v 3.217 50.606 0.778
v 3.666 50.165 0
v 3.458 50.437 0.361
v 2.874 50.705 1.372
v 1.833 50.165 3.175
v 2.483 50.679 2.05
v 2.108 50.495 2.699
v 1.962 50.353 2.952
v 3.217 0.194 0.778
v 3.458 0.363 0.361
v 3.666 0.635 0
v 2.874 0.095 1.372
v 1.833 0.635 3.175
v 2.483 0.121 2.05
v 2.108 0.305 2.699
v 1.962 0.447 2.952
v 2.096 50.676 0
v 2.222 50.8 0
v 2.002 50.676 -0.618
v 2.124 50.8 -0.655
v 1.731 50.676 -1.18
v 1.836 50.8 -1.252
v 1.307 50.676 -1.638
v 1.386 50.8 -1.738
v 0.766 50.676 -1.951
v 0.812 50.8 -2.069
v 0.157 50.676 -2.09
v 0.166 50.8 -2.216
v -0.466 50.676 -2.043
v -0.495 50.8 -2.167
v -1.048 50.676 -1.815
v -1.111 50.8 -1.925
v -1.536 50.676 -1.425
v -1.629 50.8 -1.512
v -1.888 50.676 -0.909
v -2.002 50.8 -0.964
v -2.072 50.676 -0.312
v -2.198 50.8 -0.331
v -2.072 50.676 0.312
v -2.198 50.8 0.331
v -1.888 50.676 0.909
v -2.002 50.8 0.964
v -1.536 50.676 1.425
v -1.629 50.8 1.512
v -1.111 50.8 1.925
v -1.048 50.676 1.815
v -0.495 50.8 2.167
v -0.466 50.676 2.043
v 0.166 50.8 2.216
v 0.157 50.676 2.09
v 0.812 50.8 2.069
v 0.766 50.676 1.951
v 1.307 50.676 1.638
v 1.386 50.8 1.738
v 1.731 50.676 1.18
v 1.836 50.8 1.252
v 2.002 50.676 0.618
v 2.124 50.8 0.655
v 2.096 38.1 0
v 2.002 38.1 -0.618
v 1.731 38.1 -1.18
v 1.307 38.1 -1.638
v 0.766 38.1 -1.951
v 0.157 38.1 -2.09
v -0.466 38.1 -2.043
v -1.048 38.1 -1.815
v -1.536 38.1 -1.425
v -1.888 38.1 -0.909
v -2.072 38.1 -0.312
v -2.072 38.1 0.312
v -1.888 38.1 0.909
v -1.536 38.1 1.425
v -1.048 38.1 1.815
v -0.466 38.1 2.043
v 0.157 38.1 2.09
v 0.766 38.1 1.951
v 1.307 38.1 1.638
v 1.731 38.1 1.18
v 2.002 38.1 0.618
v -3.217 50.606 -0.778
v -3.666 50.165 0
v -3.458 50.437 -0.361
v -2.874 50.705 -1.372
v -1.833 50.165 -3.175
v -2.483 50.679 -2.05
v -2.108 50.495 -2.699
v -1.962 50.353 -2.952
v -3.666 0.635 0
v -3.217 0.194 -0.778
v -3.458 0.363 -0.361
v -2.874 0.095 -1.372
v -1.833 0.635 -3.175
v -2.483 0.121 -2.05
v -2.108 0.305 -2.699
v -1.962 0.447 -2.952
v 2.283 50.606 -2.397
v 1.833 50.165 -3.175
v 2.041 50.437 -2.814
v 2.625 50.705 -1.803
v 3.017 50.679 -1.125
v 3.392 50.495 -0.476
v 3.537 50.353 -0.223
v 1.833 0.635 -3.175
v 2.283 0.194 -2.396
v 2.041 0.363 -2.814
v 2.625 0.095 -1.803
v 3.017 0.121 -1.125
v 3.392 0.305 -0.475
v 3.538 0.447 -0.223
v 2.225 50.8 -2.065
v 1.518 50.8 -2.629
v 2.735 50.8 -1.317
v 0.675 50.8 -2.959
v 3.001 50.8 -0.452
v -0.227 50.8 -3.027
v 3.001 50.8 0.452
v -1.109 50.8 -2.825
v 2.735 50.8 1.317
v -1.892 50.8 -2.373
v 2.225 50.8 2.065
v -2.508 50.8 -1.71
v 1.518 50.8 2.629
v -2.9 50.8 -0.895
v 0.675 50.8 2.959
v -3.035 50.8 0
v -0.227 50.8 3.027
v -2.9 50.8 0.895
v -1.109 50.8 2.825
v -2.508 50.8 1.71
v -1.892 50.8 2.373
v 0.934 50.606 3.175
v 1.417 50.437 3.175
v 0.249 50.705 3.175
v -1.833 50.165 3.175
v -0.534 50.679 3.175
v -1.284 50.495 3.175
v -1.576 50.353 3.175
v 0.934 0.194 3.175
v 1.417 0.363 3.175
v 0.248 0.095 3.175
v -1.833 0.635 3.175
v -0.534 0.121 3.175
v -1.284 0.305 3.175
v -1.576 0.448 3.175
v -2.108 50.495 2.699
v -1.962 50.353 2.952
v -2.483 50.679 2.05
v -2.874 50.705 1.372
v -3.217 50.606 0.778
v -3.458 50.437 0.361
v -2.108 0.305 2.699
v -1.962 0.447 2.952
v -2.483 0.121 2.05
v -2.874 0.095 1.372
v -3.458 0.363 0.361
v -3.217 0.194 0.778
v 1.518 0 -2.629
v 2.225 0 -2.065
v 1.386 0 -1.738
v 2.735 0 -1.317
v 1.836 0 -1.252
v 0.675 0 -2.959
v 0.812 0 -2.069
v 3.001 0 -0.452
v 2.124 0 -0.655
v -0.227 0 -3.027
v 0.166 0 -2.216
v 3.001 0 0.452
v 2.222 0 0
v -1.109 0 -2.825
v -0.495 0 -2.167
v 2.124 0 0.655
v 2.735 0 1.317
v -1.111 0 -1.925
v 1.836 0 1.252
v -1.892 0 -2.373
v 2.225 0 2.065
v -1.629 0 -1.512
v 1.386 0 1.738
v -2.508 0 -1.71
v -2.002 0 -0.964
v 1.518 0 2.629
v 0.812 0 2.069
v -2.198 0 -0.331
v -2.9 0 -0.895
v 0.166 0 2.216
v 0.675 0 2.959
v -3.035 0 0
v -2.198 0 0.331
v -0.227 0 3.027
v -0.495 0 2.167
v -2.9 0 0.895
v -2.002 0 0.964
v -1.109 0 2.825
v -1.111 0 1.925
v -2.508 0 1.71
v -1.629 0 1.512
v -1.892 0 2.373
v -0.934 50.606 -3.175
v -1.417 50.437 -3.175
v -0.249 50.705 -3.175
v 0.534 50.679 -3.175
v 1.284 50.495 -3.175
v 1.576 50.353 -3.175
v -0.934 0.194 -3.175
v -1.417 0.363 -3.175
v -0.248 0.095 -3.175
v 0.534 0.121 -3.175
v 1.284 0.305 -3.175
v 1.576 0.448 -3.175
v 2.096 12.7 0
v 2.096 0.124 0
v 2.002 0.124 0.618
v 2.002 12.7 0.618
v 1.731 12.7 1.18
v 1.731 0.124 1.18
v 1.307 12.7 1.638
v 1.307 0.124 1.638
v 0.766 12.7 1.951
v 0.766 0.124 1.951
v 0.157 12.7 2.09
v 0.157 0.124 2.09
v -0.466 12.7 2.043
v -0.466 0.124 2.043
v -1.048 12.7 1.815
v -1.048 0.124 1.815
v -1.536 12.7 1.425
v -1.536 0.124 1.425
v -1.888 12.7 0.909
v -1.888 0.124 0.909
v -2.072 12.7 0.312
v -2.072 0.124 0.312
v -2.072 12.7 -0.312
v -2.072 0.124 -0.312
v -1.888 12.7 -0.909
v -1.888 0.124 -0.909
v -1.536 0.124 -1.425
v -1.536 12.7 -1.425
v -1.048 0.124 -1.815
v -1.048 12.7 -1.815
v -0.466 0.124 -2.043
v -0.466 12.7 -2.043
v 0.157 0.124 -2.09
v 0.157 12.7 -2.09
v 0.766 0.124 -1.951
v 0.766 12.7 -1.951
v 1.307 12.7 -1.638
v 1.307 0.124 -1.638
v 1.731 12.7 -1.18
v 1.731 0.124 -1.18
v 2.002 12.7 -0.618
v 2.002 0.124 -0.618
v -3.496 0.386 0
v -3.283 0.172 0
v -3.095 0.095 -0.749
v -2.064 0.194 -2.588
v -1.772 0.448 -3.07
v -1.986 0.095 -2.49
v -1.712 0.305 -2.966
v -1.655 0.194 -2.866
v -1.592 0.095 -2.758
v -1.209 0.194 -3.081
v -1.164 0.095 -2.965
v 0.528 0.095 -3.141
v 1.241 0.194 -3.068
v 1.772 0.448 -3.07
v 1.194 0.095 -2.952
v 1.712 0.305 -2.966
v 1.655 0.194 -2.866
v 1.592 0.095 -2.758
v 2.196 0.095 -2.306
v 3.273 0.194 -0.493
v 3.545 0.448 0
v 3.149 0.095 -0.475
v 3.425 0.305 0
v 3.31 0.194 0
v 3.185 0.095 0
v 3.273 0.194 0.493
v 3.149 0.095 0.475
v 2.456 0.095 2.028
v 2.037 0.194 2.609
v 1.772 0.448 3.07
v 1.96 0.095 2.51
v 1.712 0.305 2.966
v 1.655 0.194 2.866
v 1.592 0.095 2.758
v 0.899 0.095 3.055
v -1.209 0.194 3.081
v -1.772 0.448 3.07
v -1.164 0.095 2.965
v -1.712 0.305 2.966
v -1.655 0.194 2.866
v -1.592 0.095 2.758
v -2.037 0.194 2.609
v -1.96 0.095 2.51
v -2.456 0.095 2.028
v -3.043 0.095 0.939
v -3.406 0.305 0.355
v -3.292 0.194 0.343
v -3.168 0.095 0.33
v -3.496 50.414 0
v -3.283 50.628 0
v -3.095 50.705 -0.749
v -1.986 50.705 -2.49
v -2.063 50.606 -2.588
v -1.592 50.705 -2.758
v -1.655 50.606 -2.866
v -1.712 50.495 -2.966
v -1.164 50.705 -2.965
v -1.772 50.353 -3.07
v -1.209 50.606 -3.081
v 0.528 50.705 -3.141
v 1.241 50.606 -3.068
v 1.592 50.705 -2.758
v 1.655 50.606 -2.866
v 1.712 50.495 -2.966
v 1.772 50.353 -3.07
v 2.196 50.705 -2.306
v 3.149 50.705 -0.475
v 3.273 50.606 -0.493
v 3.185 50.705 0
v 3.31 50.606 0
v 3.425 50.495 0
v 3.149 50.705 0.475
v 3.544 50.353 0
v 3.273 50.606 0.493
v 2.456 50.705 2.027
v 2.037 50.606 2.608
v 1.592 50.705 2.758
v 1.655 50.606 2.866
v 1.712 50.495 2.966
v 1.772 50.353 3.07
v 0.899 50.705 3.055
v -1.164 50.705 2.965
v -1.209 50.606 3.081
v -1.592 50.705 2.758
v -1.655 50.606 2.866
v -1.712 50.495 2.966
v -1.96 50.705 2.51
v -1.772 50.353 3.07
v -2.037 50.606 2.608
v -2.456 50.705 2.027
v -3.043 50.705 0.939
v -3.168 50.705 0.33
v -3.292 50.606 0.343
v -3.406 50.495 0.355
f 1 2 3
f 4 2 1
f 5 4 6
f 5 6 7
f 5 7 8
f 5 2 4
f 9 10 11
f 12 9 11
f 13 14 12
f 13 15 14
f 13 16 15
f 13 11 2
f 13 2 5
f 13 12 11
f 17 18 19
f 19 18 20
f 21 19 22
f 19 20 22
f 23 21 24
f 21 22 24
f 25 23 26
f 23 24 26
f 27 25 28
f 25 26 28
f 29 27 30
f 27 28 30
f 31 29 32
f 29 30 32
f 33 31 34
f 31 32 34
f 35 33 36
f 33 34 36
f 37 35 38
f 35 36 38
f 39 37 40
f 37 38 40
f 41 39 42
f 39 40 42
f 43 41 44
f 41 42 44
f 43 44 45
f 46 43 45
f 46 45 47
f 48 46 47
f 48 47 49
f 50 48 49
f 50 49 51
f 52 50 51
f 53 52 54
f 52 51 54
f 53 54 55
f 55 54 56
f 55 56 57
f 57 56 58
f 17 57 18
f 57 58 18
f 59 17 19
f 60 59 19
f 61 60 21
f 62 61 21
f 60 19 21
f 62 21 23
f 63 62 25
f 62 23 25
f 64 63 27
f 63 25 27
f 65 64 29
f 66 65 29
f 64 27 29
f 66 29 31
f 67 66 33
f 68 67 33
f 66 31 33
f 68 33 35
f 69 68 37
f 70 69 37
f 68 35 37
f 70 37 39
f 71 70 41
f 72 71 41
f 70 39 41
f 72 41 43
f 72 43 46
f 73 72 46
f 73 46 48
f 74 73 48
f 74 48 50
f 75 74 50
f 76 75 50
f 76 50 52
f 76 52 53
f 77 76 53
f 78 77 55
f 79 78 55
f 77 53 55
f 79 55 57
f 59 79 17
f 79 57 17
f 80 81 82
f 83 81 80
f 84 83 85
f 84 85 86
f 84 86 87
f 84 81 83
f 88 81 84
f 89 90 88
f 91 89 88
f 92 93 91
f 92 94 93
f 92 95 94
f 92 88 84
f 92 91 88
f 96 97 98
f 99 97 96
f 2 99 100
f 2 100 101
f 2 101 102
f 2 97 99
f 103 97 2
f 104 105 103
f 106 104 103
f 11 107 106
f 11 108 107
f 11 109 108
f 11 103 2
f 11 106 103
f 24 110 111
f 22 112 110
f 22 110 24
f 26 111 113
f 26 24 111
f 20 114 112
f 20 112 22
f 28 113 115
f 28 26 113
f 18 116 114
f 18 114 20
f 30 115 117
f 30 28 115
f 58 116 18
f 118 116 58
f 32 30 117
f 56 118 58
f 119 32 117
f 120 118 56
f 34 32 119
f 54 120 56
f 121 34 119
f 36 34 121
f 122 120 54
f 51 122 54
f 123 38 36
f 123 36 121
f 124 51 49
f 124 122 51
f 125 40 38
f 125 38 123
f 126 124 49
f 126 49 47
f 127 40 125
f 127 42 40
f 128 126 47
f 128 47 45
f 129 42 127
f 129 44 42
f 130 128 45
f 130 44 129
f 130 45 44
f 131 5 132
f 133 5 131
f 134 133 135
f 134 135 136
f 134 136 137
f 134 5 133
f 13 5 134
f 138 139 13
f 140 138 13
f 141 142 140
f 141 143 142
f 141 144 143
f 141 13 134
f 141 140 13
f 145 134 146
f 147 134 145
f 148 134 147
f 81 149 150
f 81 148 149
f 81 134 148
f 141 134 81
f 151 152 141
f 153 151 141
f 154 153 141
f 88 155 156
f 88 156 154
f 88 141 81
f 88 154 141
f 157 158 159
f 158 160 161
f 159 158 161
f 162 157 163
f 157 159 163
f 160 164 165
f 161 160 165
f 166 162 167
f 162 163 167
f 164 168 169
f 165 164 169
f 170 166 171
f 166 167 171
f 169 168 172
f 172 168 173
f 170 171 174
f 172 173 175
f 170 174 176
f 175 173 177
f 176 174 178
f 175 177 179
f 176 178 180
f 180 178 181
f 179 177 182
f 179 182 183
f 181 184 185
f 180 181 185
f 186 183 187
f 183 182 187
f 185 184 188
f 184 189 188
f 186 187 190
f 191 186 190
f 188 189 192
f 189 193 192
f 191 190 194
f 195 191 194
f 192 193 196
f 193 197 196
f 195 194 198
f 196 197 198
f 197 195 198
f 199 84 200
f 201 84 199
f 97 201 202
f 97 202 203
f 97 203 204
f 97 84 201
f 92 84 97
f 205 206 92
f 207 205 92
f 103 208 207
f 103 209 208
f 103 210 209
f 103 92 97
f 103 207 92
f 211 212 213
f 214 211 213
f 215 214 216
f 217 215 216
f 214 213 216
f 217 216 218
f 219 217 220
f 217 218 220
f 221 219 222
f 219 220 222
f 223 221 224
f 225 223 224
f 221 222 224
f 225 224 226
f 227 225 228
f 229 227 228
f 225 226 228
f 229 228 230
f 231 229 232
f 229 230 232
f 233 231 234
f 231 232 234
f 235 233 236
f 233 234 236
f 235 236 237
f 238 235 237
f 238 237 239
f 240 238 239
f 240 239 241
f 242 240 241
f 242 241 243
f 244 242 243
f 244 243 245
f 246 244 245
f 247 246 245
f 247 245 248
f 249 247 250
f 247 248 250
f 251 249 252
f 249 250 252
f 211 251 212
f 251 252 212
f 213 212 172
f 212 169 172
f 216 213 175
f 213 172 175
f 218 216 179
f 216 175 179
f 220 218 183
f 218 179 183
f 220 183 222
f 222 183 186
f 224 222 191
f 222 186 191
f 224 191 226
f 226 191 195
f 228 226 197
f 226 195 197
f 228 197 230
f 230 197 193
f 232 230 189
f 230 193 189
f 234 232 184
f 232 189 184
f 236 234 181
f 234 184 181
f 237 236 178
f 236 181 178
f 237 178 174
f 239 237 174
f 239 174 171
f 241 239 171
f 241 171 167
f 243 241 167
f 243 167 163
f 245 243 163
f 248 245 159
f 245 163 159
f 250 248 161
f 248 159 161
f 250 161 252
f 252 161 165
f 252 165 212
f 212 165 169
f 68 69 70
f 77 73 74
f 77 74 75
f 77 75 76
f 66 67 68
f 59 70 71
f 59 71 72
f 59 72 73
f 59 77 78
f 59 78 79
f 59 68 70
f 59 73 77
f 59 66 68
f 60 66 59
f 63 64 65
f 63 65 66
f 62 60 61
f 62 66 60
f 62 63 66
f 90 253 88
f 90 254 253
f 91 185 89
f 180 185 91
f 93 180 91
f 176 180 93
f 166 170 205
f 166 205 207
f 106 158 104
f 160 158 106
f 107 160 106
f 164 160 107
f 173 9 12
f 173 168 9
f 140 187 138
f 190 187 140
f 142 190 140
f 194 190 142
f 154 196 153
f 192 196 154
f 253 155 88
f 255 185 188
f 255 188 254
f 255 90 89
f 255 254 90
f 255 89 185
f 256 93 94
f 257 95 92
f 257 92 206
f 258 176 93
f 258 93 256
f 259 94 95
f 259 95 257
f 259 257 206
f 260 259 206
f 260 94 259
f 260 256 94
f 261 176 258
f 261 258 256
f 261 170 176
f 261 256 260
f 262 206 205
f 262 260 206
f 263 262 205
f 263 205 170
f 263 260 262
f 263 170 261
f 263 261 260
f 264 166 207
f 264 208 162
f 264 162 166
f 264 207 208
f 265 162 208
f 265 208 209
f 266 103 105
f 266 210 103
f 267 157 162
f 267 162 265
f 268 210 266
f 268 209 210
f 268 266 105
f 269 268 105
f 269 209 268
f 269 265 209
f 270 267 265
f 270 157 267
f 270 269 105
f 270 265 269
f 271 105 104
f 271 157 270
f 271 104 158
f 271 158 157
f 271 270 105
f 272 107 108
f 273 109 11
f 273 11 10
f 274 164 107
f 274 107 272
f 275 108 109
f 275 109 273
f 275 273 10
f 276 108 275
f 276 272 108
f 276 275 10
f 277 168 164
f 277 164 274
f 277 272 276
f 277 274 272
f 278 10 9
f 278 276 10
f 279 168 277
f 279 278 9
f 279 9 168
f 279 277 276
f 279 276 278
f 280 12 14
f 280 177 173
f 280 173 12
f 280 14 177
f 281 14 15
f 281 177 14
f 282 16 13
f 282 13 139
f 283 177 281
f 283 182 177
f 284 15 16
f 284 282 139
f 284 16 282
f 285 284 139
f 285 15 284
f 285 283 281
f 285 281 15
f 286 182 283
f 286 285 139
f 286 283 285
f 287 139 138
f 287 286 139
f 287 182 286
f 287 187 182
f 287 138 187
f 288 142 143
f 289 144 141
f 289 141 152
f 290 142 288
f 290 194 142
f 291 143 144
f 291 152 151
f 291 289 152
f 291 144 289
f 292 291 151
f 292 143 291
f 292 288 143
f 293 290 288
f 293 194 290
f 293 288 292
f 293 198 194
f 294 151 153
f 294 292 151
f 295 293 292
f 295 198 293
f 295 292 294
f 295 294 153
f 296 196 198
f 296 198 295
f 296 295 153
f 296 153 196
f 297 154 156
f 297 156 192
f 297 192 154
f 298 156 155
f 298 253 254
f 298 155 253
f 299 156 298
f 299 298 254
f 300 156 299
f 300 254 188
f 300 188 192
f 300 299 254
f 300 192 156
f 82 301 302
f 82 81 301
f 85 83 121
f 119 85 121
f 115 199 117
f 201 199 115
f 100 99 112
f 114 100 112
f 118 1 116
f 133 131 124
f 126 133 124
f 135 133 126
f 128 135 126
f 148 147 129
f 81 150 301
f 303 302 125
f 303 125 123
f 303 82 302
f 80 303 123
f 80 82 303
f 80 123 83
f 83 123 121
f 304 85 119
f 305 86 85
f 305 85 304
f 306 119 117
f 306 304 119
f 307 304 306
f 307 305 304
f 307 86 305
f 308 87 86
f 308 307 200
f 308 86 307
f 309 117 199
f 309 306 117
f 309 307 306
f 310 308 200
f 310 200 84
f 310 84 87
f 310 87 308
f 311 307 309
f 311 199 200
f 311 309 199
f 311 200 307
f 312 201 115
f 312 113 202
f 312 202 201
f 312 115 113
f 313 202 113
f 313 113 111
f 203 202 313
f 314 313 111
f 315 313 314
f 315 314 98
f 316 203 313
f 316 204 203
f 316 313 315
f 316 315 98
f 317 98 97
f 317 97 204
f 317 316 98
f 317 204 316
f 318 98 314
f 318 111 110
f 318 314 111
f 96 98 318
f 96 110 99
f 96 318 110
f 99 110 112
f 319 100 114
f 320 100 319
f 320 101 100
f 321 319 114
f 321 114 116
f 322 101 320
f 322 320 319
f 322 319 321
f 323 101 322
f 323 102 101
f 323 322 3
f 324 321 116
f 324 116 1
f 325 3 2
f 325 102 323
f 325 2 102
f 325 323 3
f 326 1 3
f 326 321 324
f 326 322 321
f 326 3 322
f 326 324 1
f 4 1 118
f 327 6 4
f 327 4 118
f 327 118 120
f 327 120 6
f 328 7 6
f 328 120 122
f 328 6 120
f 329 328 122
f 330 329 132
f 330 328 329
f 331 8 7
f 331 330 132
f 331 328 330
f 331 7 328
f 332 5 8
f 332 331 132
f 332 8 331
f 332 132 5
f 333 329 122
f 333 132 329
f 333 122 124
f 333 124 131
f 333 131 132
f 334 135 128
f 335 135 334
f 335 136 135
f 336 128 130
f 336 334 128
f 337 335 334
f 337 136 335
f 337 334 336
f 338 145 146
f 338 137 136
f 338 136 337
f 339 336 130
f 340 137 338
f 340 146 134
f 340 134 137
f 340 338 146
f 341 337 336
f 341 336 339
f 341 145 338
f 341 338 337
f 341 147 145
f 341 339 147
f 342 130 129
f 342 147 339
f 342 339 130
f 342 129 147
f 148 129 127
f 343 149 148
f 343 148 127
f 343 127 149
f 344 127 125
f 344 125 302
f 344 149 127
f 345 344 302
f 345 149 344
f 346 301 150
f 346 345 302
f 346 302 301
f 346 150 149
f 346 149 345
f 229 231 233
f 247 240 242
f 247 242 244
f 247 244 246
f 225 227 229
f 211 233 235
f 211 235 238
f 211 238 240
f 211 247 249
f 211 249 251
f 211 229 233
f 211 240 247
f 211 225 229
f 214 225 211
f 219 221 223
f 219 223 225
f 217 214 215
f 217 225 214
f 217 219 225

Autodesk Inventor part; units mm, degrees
ref_plane "YZ Plane" through (0, 0, 0) normal (1, 0, 0) x (0, 1, 0)
ref_plane "XZ Plane" through (0, 0, 0) normal (0, 1, 0) x (-1, 0, 0)
ref_plane "XY Plane" through (0, 0, 0) normal (0, 0, 1) x (1, 0, 0)
sketch "Sketch1" plane through (0, 0, 0) normal (0, 1, 0) x (-1, 0, 0)
  line L0 (-1.8331, -3.175) -> (-3.6662, 0)
  line L1 (-3.6662, 0) -> (-1.8331, 3.175)
  line L2 (-1.8331, 3.175) -> (1.8331, 3.175)
  line L3 (1.8331, 3.175) -> (3.6662, 0)
  line L4 (3.6662, 0) -> (1.8331, -3.175)
  line L5 (1.8331, -3.175) -> (-1.8331, -3.175)
  point P0 (0, 0)
  point P1 (0, 0)
  dimension "d0" = 6.35
extrude "Body" add sketch "Sketch1" along normal blind 50.8
sketch "Sketch2" plane through (0, 50.8, 0) normal (0, 1, 0) x (1, 0, 0)
  circle A0 centre (0, 0) radius 2.0955
  dimension "d3" = 4.191
extrude "Hole 2" cut sketch "Sketch2" against normal blind 12.7
sketch "Sketch3" plane through (0, 0, 0) normal (0, -1, 0) x (1, 0, 0)
  circle A0 centre (0, 0) radius 2.0955
  dimension "d6" = 4.191
extrude "Hole 1" cut sketch "Sketch3" against normal blind 12.7
chamfer "Hole 2 Chamfer 1" distance 0.127 distance2 0.1244 1 edges at (-2.0955, 50.8, 0) measured on face at (0.0842, 50.8, 2.8101)
chamfer "Hole 1 Chamfer 1" distance 0.127 distance2 0.1244 1 edges at (-2.0955, 0, 0) measured on face at (-0.0842, 0, 2.8101)
sketch "Sketch4" plane through (0, 0, 0) normal (0, 0, 1) x (1, 0, 0)
  line L0 (1.8331, 50.8) -> (-1.8331, 50.8) projected
  line L1 (0, 50.8) -> (-3.0353, 50.8)
  line L2 (-3.6662, 50.8) -> (-1.8331, 50.8) projected
  line L3 (-3.6662, 0) -> (-3.6662, 50.8) projected
  arc A0 (-3.0353, 50.8) -> (-3.6662, 50.165) centre (-2.2234, 49.3624) ccw
  line L4 (-3.6662, 50.165) -> (-6.3588, 52.7647)
  line L5 (-6.3588, 52.7647) -> (0, 50.8)
  line L6 (0, 50.8) -> (0, 104.464)
  point P0 (0, 0)
  dimension "d15" = 3.0353
  dimension "d16" = 1.651
  dimension "d17" = 0.635
revolve "Hole 2 Chamfer 2" cut sketch "Sketch4" angle 360 about axis through (0, 50.8, 0) along (0, 1, 0)
sketch "Sketch5" plane through (0, 0, 0) normal (0, 0, 1) x (1, 0, 0)
  line L0 (0, 0) -> (-3.0353, 0)
  line L1 (1.8331, 0) -> (-1.8331, 0) projected
  line L2 (-3.6662, 0) -> (-3.6662, 50.8) projected
  arc A0 (-3.6662, 0.635) -> (-3.0353, 0) centre (-2.2234, 1.4376) ccw
  line L3 (0, 0) -> (0, -2.1986)
  line L4 (-3.6662, 0.635) -> (-4.1154, -0.8715)
  line L5 (-4.1154, -0.8715) -> (0, 0)
  point P0 (-3.6662, 50.165)
  dimension "d19" = 3.0353
  dimension "d20" = 1.651
  dimension "d21" = 0.635
revolve "Hole 1 Chamfer 2" cut sketch "Sketch5" angle 360 about axis through (0, 0, 0) along (0, -1, 0)
chamfer "Hole 2 Chamfer 1 For Short" [suppressed]
sketch "Sketch7" plane through (0, 0, 0) normal (0, 0, 1) x (1, 0, 0)
  line L0 (0, 50.8004) -> (3.0353, 50.8)
  line L1 (3.6662, 50.8) -> (1.8331, 50.8) projected
  line L2 (3.6662, 0.635) -> (3.6662, 50.8) projected
  arc A0 (3.6662, 50.165) -> (3.0353, 50.8) centre (2.2234, 49.3624) ccw
  line L3 (3.6662, 50.165) -> (4.2663, 51.7032)
  line L4 (4.2663, 51.7032) -> (0, 50.8004)
  line L5 (0, 52.6061) -> (0, 50.8004)
  line L6 (1.8331, 50.8) -> (-1.8331, 50.8) projected
  point P0 (0, 0)
  point P1 (0, 50.8)
  dimension "d33" = 3.0353
  dimension "d34" = 1.651
  dimension "d35" = 0.635
revolve "Hole 2 Chamfer 2 For Short" [suppressed]
properties part number "Standoff .5" material "VEX Aluminum Alloy 5052-H32"
